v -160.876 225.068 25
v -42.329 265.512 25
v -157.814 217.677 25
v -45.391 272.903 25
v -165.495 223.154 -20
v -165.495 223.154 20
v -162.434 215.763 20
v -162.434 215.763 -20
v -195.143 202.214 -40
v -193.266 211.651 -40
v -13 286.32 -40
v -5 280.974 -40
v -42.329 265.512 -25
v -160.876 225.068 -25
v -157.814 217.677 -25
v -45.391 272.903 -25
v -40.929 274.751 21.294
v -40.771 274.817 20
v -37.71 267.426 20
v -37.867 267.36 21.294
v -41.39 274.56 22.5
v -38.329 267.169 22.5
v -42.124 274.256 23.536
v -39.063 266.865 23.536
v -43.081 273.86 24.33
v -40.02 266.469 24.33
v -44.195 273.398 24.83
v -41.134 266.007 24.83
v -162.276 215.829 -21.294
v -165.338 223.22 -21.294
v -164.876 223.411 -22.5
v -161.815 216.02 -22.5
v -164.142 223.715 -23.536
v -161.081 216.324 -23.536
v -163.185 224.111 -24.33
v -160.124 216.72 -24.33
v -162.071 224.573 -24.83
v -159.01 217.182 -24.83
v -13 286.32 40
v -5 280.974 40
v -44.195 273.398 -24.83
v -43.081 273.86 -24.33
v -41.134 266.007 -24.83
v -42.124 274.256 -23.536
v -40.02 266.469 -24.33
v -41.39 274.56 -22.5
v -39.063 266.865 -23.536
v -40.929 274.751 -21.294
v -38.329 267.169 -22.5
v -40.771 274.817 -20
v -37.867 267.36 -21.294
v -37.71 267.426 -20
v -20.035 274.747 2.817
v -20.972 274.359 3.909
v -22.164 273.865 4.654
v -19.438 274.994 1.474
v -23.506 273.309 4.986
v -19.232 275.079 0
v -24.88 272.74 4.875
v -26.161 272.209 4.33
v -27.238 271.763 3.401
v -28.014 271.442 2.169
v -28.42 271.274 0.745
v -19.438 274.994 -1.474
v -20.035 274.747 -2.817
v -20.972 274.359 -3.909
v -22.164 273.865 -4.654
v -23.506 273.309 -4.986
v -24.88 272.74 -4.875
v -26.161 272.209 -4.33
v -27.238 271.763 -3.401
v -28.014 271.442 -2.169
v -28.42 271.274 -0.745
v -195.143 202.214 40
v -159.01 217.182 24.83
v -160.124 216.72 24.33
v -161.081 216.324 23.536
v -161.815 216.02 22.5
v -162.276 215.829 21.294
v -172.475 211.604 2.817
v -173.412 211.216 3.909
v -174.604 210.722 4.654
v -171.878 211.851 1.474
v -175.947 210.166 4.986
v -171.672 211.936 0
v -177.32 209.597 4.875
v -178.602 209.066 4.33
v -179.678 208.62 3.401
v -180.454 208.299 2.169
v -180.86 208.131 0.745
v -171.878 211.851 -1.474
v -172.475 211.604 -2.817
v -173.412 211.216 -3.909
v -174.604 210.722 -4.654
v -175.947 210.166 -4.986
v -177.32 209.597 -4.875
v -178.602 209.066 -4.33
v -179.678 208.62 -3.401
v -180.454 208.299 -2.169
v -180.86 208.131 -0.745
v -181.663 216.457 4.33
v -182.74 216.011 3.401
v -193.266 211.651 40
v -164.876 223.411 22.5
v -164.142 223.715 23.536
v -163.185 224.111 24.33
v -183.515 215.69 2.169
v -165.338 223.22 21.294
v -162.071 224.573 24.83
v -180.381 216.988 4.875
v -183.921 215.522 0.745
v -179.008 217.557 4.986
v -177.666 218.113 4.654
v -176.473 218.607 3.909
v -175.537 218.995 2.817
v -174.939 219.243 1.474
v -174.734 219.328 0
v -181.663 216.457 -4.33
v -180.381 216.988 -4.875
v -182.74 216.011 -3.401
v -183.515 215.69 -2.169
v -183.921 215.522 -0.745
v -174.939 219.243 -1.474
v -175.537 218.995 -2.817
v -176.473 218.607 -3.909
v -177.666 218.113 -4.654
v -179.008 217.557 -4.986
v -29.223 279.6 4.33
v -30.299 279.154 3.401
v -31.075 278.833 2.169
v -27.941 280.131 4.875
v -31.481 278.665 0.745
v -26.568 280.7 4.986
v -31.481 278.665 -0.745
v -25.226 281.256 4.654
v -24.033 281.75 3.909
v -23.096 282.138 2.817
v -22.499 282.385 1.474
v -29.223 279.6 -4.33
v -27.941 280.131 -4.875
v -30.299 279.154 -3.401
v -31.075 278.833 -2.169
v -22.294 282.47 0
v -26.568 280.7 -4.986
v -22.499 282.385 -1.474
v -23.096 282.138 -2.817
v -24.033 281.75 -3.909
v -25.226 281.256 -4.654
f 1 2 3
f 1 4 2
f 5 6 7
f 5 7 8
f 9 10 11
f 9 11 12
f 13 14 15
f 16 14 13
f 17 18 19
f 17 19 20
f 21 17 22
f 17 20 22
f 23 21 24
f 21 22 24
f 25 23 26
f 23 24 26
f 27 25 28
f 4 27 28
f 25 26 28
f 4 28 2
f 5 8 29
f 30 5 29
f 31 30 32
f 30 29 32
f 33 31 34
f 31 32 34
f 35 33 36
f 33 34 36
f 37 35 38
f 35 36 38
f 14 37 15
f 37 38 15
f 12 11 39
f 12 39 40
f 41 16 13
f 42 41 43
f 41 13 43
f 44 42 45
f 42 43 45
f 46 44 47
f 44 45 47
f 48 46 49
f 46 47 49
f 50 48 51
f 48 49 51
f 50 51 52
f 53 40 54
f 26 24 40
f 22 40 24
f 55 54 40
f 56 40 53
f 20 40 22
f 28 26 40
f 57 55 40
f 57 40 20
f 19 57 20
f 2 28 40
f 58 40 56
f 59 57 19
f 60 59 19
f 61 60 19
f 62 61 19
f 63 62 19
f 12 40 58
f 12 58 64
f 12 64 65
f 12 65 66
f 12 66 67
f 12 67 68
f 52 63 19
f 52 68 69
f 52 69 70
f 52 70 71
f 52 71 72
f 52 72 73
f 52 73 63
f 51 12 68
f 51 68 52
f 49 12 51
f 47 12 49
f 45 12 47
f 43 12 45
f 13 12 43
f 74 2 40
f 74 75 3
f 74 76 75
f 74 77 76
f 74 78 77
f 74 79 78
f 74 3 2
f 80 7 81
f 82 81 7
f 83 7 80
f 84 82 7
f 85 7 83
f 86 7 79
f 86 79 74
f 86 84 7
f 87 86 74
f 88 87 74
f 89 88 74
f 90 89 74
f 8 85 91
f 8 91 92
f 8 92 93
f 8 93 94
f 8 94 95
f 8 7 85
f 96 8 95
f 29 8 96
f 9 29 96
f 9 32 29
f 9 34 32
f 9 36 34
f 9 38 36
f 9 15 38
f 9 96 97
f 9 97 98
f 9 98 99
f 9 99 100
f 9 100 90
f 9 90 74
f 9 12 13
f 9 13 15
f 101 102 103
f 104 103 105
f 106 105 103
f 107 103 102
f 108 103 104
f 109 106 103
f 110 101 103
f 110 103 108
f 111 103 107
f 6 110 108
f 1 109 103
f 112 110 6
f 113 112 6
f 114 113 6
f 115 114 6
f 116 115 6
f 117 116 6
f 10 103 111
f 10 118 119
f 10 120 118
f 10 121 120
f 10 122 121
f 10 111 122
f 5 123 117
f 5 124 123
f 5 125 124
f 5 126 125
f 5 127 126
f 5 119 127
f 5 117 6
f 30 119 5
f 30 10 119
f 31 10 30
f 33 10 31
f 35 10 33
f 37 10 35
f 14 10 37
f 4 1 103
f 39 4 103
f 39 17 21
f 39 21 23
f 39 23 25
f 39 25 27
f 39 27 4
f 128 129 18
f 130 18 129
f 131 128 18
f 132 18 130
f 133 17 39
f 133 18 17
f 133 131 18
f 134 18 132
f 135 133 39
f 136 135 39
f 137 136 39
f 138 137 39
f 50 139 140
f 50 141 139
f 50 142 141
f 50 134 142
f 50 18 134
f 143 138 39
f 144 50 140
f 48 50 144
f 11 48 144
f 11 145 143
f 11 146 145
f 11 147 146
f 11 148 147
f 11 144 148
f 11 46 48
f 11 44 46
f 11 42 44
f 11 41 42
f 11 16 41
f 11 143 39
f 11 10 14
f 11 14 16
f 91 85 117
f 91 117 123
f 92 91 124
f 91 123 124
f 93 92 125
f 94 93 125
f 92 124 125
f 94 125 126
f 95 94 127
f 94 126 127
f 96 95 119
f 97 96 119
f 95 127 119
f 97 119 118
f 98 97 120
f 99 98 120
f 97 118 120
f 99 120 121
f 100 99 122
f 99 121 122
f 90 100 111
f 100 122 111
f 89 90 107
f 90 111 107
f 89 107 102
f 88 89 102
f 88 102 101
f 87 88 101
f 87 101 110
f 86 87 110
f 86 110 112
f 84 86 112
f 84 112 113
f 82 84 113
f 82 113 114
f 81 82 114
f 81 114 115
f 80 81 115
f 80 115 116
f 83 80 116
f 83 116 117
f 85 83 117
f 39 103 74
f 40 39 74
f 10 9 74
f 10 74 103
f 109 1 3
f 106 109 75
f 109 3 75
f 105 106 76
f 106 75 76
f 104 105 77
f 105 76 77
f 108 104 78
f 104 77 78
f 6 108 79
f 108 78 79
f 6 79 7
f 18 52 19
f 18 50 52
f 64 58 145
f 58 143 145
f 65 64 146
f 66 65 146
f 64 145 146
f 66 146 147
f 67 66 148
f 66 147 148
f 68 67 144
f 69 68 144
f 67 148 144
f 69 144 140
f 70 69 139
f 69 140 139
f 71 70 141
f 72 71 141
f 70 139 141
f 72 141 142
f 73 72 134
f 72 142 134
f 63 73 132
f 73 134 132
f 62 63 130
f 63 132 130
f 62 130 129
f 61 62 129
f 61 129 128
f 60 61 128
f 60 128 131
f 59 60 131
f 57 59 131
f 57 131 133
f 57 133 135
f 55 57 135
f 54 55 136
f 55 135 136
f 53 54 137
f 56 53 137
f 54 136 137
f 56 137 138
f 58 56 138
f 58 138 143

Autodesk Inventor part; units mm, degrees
ref_plane "YZ Plane" through (0, 0, 0) normal (1, 0, 0) x (0, 1, 0)
ref_plane "XZ Plane" through (0, 0, 0) normal (0, 1, 0) x (-1, 0, 0)
ref_plane "XY Plane" through (0, 0, 0) normal (0, 0, 1) x (1, 0, 0)
sketch "Sketch2" plane through (0, 0, 0) normal (0, 0, 1) x (1, 0, 0)
  line L0 (0, 277.6336) -> (196.3166, 196.3166) construction
  line L1 (196.3166, 196.3166) -> (277.6336, 0) construction
  line L2 (277.6336, 0) -> (196.3166, -196.3166) construction
  line L3 (196.3166, -196.3166) -> (0, -277.6336) construction
  line L4 (0, -277.6336) -> (-196.3166, -196.3166) construction
  line L5 (-196.3166, -196.3166) -> (-277.6336, 0) construction
  line L6 (-277.6336, 0) -> (-196.3166, 196.3166) construction
  line L7 (-196.3166, 196.3166) -> (0, 277.6336) construction
  line L8 (-196.3166, 196.3166) -> (0, 277.6336) construction
  line L9 (-461.2666, 773.8898) -> (-221.0579, 873.3874) construction
  line L10 (-98.1583, 236.9751) -> (-341.1623, 823.6386) construction
  line L11 (-221.0579, 873.3874) -> (0, 873.3874) construction
  line L12 (0, 873.3874) -> (0, 277.6336) construction
  line L13 (-461.2666, 773.8898) -> (-617.5782, 617.5782) construction
  line L14 (-617.5782, 617.5782) -> (-196.3166, 196.3166) construction
  line L15 (-5, 280.9745) -> (-195.1434, 202.2145) construction
  line L16 (-195.1434, 202.2145) -> (-610.5071, 617.5782) construction
  line L17 (-610.5071, 617.5782) -> (-458.4343, 769.651) construction
  line L18 (-458.4343, 769.651) -> (-220.0634, 868.3874) construction
  line L19 (-220.0634, 868.3874) -> (-5, 868.3874) construction
  line L20 (-5, 868.3874) -> (-5, 280.9745) construction
  line L21 (-13, 286.3199) -> (-193.2664, 211.6511) construction
  line L22 (-193.2664, 211.6511) -> (-599.1934, 617.5782) construction
  line L23 (-599.1934, 617.5782) -> (-453.9027, 762.8689) construction
  line L24 (-453.9027, 762.8689) -> (-218.4721, 860.3874) construction
  line L25 (-218.4721, 860.3874) -> (-13, 860.3874) construction
  line L26 (-13, 860.3874) -> (-13, 286.3199) construction
  line L27 (-5, 280.9745) -> (-195.1434, 202.2145)
  line L28 (-195.1434, 202.2145) -> (-193.2664, 211.6511)
  line L29 (-193.2664, 211.6511) -> (-13, 286.3199)
  line L30 (-13, 286.3199) -> (-5, 280.9745)
  point P0 (0, 0)
  point P1 (0, 0)
  point P2 (0, 0)
  dimension "d0" = 513
  dimension "d1" = 260
  dimension "d2" = 635
  dimension "d6" = 5
  dimension "d7" = 8
extrude "Extrusion1" add sketch "Sketch2" along normal mid plane 80
sketch "Sketch3" plane through (-13, 286.3199, -40) normal (-0.3827, 0.9239, 0) x (0.9239, 0.3827, 0)
  line L0 (-165.0595, -15) -> (-30.0595, -15)
  line L1 (-30.0595, -15) -> (-30.0595, -65)
  line L2 (-30.0595, -65) -> (-165.0595, -65)
  line L3 (-165.0595, -65) -> (-165.0595, -15)
  circle A0 centre (-15.0595, -40) radius 5
  circle A1 centre (-180.0595, -40) radius 5
  line L4 (0, -80) -> (-195.1189, -80) projected
  line L5 (-97.5595, -40) -> (-97.5595, -80) construction
  line L6 (5.3454, 0) -> (5.3454, -80) construction
  point P0 (-97.5595, -15)
  point P1 (-165.0595, -40)
  point P2 (-30.0595, -40)
  point P3 (5.3454, -40)
  dimension "d10" = 135
  dimension "d11" = 10
  dimension "d12" = 15
  dimension "d13" = 50
extrude "Extrusion2" cut sketch "Sketch3" against normal up to surface (8 mm away)
fillet "Fillet1" radius 5 4 edges at (-163.9643, 219.4589, -25) (-39.2406, 271.1211, -25) (-39.2406, 271.1211, 25) (-163.9643, 219.4589, 25)
equation "\"d0\" = Барабан_габарит_по_кассетам"
equation "\"d1\" = Кассета_длина_грани"
equation "\"d2\" = Кассета_высота"
equation "\"d10\" = Барабан_Длина_окна"
equation "\"d11\" = Кассета_Диам_шпильки"
equation "\"d13\" = Барабан_Ширина_окна"
equation "\"Барабан_габарит_по_кассетам\" = 513"
equation "\"Кассета_длина_грани\" = 260"
equation "\"Кассета_высота\" = 635"
equation "\"Барабан_Длина_окна\" = 135"
equation "\"Кассета_Диам_шпильки\" = 10"
equation "\"Барабан_Ширина_окна\" = 50"
properties part number "ДМФ 01 54 Нижний лист"
